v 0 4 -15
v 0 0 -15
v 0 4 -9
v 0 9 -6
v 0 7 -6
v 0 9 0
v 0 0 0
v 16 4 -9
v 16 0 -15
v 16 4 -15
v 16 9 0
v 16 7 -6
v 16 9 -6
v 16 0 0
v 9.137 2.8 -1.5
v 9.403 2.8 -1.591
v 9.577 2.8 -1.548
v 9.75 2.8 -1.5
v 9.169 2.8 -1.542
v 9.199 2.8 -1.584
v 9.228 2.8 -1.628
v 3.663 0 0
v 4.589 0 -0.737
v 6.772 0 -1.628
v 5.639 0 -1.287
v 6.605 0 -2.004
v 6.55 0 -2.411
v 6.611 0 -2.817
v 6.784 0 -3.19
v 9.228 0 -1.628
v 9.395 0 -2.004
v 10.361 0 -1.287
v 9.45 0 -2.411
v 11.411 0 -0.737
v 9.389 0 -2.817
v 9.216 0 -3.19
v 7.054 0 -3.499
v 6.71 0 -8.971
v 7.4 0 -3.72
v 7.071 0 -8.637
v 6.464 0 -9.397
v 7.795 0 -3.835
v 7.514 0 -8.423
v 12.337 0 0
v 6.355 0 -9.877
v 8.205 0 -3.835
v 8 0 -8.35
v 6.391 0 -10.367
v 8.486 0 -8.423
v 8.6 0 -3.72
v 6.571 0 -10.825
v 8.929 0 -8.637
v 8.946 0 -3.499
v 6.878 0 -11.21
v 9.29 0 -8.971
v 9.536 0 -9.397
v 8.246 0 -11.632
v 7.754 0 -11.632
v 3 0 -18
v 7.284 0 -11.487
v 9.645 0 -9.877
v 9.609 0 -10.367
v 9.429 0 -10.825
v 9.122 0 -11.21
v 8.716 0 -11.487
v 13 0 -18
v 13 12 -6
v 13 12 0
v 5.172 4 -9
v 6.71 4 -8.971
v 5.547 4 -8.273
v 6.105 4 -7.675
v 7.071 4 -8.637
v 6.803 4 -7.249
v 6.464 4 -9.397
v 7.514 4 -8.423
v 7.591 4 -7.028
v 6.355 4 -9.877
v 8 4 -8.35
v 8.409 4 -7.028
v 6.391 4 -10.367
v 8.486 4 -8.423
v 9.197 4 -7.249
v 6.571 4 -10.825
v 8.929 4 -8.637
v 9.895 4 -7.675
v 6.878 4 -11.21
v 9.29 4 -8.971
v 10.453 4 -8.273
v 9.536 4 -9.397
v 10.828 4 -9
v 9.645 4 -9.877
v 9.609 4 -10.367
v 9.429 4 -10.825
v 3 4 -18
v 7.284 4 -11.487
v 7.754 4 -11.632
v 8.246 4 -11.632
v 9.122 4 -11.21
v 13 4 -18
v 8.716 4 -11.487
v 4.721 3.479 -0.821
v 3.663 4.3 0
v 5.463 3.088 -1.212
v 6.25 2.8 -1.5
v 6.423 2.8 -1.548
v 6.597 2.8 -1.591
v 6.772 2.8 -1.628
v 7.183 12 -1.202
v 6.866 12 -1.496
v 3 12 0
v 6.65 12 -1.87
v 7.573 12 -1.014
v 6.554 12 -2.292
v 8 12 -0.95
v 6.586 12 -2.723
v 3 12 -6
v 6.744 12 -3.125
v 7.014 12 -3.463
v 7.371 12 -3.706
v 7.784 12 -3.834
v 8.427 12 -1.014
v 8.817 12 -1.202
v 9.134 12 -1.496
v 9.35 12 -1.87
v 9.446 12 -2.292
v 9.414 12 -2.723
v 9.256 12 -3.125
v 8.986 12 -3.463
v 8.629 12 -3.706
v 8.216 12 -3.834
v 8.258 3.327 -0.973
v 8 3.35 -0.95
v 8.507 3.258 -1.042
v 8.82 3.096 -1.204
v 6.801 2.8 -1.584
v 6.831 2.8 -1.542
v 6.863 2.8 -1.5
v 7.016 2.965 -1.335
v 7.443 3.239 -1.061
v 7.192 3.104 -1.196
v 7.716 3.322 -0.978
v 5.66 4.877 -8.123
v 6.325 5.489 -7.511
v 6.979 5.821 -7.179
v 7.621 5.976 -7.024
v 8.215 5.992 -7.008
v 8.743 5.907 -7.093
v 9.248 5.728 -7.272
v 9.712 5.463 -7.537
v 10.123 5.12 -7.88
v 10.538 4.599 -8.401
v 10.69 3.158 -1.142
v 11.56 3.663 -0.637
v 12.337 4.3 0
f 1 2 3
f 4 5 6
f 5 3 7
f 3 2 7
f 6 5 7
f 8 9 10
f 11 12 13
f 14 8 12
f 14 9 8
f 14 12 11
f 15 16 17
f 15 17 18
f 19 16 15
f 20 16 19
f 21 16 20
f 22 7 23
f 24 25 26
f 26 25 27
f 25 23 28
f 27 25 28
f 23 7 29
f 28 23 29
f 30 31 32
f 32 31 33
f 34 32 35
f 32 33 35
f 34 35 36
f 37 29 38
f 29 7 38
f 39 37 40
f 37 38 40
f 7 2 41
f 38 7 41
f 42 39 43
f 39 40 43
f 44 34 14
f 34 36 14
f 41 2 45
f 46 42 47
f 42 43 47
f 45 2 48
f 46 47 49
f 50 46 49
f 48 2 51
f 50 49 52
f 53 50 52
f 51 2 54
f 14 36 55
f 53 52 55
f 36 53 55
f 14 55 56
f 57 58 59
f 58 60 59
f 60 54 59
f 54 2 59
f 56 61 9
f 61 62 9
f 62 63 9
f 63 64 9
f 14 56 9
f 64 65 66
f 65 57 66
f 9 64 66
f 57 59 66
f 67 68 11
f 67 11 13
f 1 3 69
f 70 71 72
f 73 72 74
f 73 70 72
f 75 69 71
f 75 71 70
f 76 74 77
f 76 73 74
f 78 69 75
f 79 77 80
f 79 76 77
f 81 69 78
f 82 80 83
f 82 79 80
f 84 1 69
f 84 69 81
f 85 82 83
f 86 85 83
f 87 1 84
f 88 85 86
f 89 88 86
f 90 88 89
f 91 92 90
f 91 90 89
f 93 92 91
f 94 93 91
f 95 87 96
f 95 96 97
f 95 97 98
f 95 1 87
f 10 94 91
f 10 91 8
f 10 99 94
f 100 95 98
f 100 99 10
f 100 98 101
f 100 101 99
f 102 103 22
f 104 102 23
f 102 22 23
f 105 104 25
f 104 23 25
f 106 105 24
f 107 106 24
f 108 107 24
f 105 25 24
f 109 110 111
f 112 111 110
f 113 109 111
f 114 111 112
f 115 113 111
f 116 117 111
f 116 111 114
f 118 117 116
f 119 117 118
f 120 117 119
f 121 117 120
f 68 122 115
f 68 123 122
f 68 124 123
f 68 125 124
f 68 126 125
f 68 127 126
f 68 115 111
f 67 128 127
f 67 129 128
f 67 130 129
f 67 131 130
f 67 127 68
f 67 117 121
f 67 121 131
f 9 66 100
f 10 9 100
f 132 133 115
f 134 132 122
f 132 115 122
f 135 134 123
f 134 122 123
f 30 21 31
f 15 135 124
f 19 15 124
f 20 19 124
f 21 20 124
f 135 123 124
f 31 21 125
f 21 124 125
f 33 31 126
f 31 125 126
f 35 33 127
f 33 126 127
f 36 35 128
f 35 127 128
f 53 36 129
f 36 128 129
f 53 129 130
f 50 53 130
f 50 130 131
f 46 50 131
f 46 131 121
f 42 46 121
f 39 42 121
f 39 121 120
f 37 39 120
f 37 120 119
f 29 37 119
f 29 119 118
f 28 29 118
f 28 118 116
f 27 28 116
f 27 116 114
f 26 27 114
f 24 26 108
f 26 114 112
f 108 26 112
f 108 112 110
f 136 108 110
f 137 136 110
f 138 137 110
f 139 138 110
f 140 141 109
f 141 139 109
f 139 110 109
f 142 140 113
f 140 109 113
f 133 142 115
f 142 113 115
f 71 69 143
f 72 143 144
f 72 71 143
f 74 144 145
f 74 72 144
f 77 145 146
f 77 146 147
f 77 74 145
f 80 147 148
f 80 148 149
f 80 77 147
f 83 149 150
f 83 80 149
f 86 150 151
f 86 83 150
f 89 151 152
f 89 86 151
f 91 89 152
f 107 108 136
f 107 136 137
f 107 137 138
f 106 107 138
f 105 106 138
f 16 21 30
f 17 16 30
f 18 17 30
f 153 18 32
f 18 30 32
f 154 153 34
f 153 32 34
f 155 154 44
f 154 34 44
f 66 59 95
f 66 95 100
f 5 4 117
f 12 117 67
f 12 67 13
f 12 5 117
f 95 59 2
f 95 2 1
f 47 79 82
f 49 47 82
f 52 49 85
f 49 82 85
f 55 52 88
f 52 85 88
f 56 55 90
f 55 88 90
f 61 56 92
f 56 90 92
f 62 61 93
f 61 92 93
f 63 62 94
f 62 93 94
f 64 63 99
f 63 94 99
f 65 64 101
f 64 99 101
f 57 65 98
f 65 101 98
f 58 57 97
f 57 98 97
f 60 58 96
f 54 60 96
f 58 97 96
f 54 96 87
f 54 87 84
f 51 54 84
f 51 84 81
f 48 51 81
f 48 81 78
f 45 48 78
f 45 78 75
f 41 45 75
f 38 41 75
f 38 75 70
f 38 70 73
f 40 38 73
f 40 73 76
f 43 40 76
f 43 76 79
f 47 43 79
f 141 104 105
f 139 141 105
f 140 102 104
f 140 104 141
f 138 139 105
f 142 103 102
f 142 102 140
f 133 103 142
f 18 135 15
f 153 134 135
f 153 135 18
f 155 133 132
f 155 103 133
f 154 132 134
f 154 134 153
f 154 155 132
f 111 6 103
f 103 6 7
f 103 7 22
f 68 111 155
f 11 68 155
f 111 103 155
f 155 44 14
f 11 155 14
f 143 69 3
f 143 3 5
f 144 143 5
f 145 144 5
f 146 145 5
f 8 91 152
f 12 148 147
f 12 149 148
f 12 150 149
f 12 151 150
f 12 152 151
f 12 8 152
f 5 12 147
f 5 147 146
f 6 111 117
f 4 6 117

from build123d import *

# Parameters (mm, degrees)
SKETCH_1_W          = 16
SKETCH_1_H          = 18
EXTRUDE_1_DEPTH     = 4
SKETCH_2_R          = 1.65
CUT_EXTRUDE_1_DEPTH = 4
SKETCH_3_W          = 16
SKETCH_3_H          = 6
EXTRUDE_2_DEPTH     = 8
SKETCH_4_R          = 1.45
CUT_EXTRUDE_2_DEPTH = 27.907248094
CHAMFER_1_SIZE      = 3
CHAMFER_2_SIZE      = 3
CHAMFER_3_SIZE      = 3
SKETCH_6_R          = 3
CUT_EXTRUDE_3_DEPTH = 26.377155081
SKETCH_7_R          = 6.25
CUT_EXTRUDE_4_DEPTH = 2.8
CHAMFER_4_SIZE      = 1.5


with BuildPart() as part:
    # 草图1 → 凸台-拉伸1 (new body)
    with BuildSketch(Plane(origin=(0, 0, 0), x_dir=(1, 0, 0), z_dir=(0, 1, 0))):
        with Locations((8, 9)):
            Rectangle(SKETCH_1_W, SKETCH_1_H)
    extrude(amount=EXTRUDE_1_DEPTH)

    # 草图2 → 切除-拉伸1 (cut)
    with BuildSketch(Plane(origin=(0, 4, 0), x_dir=(1, 0, 0), z_dir=(0, 1, 0))):
        with Locations(Location((8, 10, 0), (0, 0, 270))):
            Circle(SKETCH_2_R)
    extrude(amount=-CUT_EXTRUDE_1_DEPTH, mode=Mode.SUBTRACT)

    # 草图3 → 凸台-拉伸2 (add)
    with BuildSketch(Plane(origin=(0, 4, 0), x_dir=(1, 0, 0), z_dir=(0, 1, 0))):
        with Locations((8, 3)):
            Rectangle(SKETCH_3_W, SKETCH_3_H)
    extrude(amount=EXTRUDE_2_DEPTH)

    # 草图4 → 切除-拉伸2 (cut, through all)
    with BuildSketch(Plane(origin=(0, 12, 0), x_dir=(1, 0, 0), z_dir=(0, 1, 0))):
        with Locations(Location((8, 2.4, 0), (0, 0, 270))):
            Circle(SKETCH_4_R)
    extrude(amount=-CUT_EXTRUDE_2_DEPTH, mode=Mode.SUBTRACT)

    # 倒角1
    chamfer_1_edges = [part.edges().sort_by_distance(p)[0] for p in [
        (0, 2, -18),
        (16, 2, -18),
    ]]
    chamfer(chamfer_1_edges, length=CHAMFER_1_SIZE)

    # 倒角2
    # the kernel refuses this chamfer: 3 mm, written as the material it adds along each edge
    with BuildSketch(Plane(origin=(16, 4, -6), x_dir=(0, -0.02749587661058635, -0.9996219169112968), z_dir=(-1, 0, 0))) as chamfer_2_piece_1_section:
        Polygon((CHAMFER_2_SIZE * 0.999621916911, -CHAMFER_2_SIZE * 0.0274958766106), (-CHAMFER_2_SIZE * 0.0274958766106, -CHAMFER_2_SIZE * 0.999621916911), (0, 0), align=None)
    chamfer_2_piece_1 = extrude(amount=16, mode=Mode.PRIVATE)
    chamfer_2_piece_1 = chamfer_2_piece_1 - Plane(origin=(8, 4.994786575, -10), x_dir=(0, 0, 1), z_dir=(0, 1, 0)) * Cylinder(1.65, 44, mode=Mode.PRIVATE)
    add(chamfer_2_piece_1)

    # 倒角3
    chamfer_3_edges = [part.edges().sort_by_distance(p)[0] for p in [
        (0, 12, -3),
        (16, 12, -3),
    ]]
    chamfer(chamfer_3_edges, length=CHAMFER_3_SIZE)

    # 草图6 → 切除-拉伸3 (cut, through all)
    with BuildSketch(Plane(origin=(0, 4, 0), x_dir=(1, 0, 0), z_dir=(0, 1, 0))):
        with Locations((8, 10)):
            Circle(SKETCH_6_R)
    extrude(amount=CUT_EXTRUDE_3_DEPTH, mode=Mode.SUBTRACT)

    # 草图7 → 切除-拉伸4 (cut)
    with BuildSketch(Plane(origin=(0, 0, 0), x_dir=(-1, 0, 0), z_dir=(0, -1, 0))):
        with Locations((-8, -4.5)):
            Circle(SKETCH_7_R)
    extrude(amount=-CUT_EXTRUDE_4_DEPTH, mode=Mode.SUBTRACT)

    # 倒角4
    # the kernel refuses this chamfer: 1.5 mm, written as the material it takes off along each edge
    with BuildSketch(Plane(origin=(16.194862375, 2.8, 0), x_dir=(0, 0.9996219169112969, 0.027495876610586382), z_dir=(-1, 0, 0))) as chamfer_4_piece_1_section:
        Polygon((CHAMFER_4_SIZE * 0.999621916911, CHAMFER_4_SIZE * 0.0274958766106), (-CHAMFER_4_SIZE * 0.0274958766106, CHAMFER_4_SIZE * 0.999621916911), (0, 0), align=None)
    chamfer_4_piece_1 = extrude(amount=16.38972475, mode=Mode.PRIVATE)
    chamfer_4_piece_1 = chamfer_4_piece_1 & Plane(origin=(8, 3.325118299, 4.5), x_dir=(-1, 0, 0), z_dir=(0, -1, 0)) * Cylinder(6.25, 39, mode=Mode.PRIVATE)
    add(chamfer_4_piece_1, mode=Mode.SUBTRACT)


solid = part.part
